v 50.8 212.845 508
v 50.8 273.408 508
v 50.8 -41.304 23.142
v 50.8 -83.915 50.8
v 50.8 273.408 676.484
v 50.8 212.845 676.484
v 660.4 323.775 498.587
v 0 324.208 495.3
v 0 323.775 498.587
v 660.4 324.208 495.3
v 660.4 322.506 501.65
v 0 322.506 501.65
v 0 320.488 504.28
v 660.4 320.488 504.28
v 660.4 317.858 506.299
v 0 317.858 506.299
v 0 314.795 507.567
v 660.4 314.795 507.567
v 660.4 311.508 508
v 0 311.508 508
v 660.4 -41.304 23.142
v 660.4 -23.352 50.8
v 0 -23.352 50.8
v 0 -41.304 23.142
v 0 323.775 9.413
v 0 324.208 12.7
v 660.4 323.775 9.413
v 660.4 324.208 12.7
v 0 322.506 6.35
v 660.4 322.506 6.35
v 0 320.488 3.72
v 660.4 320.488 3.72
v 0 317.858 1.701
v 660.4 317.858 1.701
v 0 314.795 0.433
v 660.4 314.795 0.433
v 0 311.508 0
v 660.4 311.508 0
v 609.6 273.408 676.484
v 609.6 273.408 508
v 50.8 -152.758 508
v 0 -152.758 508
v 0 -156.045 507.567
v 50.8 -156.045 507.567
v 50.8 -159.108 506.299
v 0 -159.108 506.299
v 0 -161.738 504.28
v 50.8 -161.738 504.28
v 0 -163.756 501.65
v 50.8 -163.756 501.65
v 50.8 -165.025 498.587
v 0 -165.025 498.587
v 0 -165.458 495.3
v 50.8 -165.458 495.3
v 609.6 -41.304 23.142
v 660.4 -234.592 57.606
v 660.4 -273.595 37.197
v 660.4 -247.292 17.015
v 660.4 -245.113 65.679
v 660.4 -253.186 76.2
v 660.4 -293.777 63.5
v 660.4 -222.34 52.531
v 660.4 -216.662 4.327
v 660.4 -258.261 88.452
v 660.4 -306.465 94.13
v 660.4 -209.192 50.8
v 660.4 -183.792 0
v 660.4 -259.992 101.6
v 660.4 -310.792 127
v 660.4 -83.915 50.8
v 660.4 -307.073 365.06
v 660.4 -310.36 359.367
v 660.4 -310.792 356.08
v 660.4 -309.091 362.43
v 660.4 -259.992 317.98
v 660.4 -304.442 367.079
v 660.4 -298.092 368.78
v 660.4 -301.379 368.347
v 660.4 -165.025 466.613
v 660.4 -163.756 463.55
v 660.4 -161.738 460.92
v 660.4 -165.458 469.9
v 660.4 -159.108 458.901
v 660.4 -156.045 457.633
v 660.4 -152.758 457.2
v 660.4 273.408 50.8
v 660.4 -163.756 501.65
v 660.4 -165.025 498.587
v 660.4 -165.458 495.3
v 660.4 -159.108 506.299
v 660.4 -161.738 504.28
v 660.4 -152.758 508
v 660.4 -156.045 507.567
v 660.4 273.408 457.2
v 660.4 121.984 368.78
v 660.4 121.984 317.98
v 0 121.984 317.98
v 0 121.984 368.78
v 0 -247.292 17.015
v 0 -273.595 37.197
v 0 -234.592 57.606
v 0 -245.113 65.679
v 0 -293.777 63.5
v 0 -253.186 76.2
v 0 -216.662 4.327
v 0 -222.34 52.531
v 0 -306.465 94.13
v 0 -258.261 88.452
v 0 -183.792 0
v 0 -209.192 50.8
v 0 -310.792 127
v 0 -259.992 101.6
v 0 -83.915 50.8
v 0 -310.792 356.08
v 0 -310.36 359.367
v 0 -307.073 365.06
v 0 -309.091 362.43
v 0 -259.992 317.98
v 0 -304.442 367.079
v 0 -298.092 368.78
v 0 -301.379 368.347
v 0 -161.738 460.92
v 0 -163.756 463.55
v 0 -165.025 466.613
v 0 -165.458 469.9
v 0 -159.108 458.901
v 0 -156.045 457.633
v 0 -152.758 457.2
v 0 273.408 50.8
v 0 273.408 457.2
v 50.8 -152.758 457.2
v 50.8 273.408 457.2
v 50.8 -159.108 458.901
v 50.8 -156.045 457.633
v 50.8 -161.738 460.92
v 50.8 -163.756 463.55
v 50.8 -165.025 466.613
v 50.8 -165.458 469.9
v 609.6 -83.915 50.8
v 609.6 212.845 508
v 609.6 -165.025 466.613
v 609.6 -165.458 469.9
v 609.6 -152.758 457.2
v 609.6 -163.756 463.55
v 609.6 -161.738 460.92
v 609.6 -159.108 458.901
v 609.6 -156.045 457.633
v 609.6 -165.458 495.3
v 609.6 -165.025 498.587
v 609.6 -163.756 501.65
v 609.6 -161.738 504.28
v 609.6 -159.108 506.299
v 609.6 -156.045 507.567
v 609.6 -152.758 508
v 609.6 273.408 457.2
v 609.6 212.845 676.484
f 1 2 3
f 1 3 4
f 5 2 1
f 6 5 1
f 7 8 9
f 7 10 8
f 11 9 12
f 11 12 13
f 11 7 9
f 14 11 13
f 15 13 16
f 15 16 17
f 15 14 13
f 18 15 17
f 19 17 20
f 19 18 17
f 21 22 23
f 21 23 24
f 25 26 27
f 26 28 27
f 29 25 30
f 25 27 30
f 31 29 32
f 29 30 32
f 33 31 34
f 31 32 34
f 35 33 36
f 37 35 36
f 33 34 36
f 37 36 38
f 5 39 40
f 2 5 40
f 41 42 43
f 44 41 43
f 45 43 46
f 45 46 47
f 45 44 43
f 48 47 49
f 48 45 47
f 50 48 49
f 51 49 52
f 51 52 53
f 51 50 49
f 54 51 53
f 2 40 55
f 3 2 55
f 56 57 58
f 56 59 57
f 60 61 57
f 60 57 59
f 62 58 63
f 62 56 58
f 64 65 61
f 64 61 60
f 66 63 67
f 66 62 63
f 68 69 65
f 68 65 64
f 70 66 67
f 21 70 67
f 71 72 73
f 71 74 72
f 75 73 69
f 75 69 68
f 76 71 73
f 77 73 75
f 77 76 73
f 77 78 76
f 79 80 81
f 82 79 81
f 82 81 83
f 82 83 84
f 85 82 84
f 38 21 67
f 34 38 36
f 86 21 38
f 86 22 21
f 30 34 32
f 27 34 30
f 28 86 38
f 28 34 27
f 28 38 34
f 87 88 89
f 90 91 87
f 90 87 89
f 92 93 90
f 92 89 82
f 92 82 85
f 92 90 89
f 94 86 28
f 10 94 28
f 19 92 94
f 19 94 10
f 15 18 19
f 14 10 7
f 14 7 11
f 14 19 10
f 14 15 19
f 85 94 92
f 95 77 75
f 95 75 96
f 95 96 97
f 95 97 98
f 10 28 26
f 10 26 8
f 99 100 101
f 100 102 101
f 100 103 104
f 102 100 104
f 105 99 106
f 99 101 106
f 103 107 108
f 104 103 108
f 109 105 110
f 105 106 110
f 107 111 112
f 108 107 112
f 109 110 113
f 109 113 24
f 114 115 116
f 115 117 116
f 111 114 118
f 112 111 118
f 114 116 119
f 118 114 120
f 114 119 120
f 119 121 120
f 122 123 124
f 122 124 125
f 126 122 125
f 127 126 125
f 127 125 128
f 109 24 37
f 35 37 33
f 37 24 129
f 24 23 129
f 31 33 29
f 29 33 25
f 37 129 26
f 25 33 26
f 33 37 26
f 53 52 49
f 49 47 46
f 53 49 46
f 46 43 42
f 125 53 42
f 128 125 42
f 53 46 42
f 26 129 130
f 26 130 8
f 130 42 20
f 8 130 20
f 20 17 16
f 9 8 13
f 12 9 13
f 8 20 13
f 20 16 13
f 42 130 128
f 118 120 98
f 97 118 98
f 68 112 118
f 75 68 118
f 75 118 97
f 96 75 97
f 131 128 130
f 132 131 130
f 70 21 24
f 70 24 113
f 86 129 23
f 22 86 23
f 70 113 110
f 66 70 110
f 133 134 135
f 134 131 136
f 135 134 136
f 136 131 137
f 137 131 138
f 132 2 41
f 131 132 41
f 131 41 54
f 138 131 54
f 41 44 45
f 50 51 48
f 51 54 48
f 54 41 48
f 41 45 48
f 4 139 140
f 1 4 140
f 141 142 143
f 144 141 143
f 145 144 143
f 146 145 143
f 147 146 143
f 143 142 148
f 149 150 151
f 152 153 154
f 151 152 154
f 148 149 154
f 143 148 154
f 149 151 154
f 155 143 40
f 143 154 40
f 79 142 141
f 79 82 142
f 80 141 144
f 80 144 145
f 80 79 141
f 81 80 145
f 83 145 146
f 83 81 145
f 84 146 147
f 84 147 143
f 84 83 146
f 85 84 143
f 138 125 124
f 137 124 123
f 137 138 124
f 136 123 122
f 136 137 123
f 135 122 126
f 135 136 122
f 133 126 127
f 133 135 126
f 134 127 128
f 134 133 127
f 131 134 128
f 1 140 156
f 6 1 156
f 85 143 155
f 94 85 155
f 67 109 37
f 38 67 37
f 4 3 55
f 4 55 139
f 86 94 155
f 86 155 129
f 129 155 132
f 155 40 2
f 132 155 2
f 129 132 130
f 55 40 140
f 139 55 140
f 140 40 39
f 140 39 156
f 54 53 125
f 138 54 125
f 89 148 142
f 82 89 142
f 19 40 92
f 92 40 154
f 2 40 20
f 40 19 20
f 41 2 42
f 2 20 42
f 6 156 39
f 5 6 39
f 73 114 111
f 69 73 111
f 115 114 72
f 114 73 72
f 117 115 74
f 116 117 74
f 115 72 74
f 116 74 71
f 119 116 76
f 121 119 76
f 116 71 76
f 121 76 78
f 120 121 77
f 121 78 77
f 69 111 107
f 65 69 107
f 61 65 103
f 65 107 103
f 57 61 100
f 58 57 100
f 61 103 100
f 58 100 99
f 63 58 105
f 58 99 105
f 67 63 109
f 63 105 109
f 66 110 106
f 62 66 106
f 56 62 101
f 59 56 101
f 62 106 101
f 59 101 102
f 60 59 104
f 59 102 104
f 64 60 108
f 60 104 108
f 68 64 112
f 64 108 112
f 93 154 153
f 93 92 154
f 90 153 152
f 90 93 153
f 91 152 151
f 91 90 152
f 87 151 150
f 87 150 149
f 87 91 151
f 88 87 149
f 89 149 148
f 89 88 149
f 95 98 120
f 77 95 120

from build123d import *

# Parameters (mm, degrees)
F1_DEPTH = 660.4
F3_DEPTH = 86.54255
F5_DEPTH = 558.8
F7_DEPTH = 762
F8_R     = 12.7


# Not quite as in the source:
# - a feature of the source that left no trace in its solid (it failed there, or was rolled back) is left out


with BuildPart() as f1:
    # F0 (on Right) → F1 (new body)
    with BuildSketch(Plane.YZ):
        with BuildLine():
            Line((324.2077479366, 0), (324.2077479366, 508))
            Line((324.2077479366, 508), (-165.4576212168, 508))
            Line((-165.4576212168, 508), (-165.4576212168, 457.2))
            Line((-165.4576212168, 457.2), (273.4077479366, 457.2))
            Line((273.4077479366, 457.2), (273.4077479366, 50.8))
            Line((273.4077479366, 50.8), (-209.1922520634, 50.8))
            ThreePointArc((-209.1922520634, 50.8), (-245.1132765477, 65.6789755157), (-259.9922520634, 101.6))
            Line((-259.9922520634, 101.6), (-259.9922520634, 317.9801367223))
            Line((-259.9922520634, 317.9801367223), (121.9838493824, 317.9801367223))
            Line((121.9838493824, 317.9801367223), (121.9838493824, 368.7801367223))
            Line((121.9838493824, 368.7801367223), (-310.7922520634, 368.7801367223))
            Line((-310.7922520634, 368.7801367223), (-310.7922520634, 127))
            ThreePointArc((-310.7922520634, 127), (-273.5948132741, 37.1974387893), (-183.7922520634, 0))
            Line((-183.7922520634, 0), (324.2077479366, 0))
        make_face()
    extrude(amount=F1_DEPTH)

    # F2 (on face) → F3 (cut)
    with BuildSketch(Plane.XY.offset(508)):
        Polygon((50.8, 273.4077479366), (50.8, -114.6576212168), (50.8, -165.4576212168), (609.6, -165.4576212168), (609.6, -114.6576212168), (609.6, 273.4077479366), align=None)
    extrude(amount=-F3_DEPTH, mode=Mode.SUBTRACT)

    # F6 (on face) → F7 (cut)
    with BuildSketch(Plane(origin=(0, 0, 0), x_dir=(0, -1, 0), z_dir=(-1, 0, 0))):
        Polygon((23.3521865532, 50.8), (41.3043974346, 23.1421194673), (83.9152134845, 50.8), align=None)
    extrude(amount=-F7_DEPTH, mode=Mode.SUBTRACT)

    # F8
    f8_edges = [f1.edges().sort_by_distance(p)[0] for p in [
        (330.2, 324.207748, 0),
        (330.2, 324.207748, 508),
        (25.4, -165.457621, 508),
        (25.4, -165.457621, 457.2),
        (635, -165.457621, 508),
        (635, -165.457621, 457.2),
        (330.2, -310.792252, 368.780137),
    ]]
    fillet(f8_edges, radius=F8_R)


with BuildPart() as f5:
    # F4 (on face) → F5 (new body, through all)
    with BuildSketch(Plane(origin=(609.6, 0, 0), x_dir=(0, -1, 0), z_dir=(-1, 0, 0))):
        Polygon((-273.4077479366, 676.4837503433), (-273.4077479366, 508), (41.3043974346, 23.1421194673), (83.9152134845, 50.8), (-212.8447210052, 508), (-212.8447210052, 676.4837503433), align=None)
    extrude(amount=F5_DEPTH)


solid = Compound([f1.part, f5.part])
